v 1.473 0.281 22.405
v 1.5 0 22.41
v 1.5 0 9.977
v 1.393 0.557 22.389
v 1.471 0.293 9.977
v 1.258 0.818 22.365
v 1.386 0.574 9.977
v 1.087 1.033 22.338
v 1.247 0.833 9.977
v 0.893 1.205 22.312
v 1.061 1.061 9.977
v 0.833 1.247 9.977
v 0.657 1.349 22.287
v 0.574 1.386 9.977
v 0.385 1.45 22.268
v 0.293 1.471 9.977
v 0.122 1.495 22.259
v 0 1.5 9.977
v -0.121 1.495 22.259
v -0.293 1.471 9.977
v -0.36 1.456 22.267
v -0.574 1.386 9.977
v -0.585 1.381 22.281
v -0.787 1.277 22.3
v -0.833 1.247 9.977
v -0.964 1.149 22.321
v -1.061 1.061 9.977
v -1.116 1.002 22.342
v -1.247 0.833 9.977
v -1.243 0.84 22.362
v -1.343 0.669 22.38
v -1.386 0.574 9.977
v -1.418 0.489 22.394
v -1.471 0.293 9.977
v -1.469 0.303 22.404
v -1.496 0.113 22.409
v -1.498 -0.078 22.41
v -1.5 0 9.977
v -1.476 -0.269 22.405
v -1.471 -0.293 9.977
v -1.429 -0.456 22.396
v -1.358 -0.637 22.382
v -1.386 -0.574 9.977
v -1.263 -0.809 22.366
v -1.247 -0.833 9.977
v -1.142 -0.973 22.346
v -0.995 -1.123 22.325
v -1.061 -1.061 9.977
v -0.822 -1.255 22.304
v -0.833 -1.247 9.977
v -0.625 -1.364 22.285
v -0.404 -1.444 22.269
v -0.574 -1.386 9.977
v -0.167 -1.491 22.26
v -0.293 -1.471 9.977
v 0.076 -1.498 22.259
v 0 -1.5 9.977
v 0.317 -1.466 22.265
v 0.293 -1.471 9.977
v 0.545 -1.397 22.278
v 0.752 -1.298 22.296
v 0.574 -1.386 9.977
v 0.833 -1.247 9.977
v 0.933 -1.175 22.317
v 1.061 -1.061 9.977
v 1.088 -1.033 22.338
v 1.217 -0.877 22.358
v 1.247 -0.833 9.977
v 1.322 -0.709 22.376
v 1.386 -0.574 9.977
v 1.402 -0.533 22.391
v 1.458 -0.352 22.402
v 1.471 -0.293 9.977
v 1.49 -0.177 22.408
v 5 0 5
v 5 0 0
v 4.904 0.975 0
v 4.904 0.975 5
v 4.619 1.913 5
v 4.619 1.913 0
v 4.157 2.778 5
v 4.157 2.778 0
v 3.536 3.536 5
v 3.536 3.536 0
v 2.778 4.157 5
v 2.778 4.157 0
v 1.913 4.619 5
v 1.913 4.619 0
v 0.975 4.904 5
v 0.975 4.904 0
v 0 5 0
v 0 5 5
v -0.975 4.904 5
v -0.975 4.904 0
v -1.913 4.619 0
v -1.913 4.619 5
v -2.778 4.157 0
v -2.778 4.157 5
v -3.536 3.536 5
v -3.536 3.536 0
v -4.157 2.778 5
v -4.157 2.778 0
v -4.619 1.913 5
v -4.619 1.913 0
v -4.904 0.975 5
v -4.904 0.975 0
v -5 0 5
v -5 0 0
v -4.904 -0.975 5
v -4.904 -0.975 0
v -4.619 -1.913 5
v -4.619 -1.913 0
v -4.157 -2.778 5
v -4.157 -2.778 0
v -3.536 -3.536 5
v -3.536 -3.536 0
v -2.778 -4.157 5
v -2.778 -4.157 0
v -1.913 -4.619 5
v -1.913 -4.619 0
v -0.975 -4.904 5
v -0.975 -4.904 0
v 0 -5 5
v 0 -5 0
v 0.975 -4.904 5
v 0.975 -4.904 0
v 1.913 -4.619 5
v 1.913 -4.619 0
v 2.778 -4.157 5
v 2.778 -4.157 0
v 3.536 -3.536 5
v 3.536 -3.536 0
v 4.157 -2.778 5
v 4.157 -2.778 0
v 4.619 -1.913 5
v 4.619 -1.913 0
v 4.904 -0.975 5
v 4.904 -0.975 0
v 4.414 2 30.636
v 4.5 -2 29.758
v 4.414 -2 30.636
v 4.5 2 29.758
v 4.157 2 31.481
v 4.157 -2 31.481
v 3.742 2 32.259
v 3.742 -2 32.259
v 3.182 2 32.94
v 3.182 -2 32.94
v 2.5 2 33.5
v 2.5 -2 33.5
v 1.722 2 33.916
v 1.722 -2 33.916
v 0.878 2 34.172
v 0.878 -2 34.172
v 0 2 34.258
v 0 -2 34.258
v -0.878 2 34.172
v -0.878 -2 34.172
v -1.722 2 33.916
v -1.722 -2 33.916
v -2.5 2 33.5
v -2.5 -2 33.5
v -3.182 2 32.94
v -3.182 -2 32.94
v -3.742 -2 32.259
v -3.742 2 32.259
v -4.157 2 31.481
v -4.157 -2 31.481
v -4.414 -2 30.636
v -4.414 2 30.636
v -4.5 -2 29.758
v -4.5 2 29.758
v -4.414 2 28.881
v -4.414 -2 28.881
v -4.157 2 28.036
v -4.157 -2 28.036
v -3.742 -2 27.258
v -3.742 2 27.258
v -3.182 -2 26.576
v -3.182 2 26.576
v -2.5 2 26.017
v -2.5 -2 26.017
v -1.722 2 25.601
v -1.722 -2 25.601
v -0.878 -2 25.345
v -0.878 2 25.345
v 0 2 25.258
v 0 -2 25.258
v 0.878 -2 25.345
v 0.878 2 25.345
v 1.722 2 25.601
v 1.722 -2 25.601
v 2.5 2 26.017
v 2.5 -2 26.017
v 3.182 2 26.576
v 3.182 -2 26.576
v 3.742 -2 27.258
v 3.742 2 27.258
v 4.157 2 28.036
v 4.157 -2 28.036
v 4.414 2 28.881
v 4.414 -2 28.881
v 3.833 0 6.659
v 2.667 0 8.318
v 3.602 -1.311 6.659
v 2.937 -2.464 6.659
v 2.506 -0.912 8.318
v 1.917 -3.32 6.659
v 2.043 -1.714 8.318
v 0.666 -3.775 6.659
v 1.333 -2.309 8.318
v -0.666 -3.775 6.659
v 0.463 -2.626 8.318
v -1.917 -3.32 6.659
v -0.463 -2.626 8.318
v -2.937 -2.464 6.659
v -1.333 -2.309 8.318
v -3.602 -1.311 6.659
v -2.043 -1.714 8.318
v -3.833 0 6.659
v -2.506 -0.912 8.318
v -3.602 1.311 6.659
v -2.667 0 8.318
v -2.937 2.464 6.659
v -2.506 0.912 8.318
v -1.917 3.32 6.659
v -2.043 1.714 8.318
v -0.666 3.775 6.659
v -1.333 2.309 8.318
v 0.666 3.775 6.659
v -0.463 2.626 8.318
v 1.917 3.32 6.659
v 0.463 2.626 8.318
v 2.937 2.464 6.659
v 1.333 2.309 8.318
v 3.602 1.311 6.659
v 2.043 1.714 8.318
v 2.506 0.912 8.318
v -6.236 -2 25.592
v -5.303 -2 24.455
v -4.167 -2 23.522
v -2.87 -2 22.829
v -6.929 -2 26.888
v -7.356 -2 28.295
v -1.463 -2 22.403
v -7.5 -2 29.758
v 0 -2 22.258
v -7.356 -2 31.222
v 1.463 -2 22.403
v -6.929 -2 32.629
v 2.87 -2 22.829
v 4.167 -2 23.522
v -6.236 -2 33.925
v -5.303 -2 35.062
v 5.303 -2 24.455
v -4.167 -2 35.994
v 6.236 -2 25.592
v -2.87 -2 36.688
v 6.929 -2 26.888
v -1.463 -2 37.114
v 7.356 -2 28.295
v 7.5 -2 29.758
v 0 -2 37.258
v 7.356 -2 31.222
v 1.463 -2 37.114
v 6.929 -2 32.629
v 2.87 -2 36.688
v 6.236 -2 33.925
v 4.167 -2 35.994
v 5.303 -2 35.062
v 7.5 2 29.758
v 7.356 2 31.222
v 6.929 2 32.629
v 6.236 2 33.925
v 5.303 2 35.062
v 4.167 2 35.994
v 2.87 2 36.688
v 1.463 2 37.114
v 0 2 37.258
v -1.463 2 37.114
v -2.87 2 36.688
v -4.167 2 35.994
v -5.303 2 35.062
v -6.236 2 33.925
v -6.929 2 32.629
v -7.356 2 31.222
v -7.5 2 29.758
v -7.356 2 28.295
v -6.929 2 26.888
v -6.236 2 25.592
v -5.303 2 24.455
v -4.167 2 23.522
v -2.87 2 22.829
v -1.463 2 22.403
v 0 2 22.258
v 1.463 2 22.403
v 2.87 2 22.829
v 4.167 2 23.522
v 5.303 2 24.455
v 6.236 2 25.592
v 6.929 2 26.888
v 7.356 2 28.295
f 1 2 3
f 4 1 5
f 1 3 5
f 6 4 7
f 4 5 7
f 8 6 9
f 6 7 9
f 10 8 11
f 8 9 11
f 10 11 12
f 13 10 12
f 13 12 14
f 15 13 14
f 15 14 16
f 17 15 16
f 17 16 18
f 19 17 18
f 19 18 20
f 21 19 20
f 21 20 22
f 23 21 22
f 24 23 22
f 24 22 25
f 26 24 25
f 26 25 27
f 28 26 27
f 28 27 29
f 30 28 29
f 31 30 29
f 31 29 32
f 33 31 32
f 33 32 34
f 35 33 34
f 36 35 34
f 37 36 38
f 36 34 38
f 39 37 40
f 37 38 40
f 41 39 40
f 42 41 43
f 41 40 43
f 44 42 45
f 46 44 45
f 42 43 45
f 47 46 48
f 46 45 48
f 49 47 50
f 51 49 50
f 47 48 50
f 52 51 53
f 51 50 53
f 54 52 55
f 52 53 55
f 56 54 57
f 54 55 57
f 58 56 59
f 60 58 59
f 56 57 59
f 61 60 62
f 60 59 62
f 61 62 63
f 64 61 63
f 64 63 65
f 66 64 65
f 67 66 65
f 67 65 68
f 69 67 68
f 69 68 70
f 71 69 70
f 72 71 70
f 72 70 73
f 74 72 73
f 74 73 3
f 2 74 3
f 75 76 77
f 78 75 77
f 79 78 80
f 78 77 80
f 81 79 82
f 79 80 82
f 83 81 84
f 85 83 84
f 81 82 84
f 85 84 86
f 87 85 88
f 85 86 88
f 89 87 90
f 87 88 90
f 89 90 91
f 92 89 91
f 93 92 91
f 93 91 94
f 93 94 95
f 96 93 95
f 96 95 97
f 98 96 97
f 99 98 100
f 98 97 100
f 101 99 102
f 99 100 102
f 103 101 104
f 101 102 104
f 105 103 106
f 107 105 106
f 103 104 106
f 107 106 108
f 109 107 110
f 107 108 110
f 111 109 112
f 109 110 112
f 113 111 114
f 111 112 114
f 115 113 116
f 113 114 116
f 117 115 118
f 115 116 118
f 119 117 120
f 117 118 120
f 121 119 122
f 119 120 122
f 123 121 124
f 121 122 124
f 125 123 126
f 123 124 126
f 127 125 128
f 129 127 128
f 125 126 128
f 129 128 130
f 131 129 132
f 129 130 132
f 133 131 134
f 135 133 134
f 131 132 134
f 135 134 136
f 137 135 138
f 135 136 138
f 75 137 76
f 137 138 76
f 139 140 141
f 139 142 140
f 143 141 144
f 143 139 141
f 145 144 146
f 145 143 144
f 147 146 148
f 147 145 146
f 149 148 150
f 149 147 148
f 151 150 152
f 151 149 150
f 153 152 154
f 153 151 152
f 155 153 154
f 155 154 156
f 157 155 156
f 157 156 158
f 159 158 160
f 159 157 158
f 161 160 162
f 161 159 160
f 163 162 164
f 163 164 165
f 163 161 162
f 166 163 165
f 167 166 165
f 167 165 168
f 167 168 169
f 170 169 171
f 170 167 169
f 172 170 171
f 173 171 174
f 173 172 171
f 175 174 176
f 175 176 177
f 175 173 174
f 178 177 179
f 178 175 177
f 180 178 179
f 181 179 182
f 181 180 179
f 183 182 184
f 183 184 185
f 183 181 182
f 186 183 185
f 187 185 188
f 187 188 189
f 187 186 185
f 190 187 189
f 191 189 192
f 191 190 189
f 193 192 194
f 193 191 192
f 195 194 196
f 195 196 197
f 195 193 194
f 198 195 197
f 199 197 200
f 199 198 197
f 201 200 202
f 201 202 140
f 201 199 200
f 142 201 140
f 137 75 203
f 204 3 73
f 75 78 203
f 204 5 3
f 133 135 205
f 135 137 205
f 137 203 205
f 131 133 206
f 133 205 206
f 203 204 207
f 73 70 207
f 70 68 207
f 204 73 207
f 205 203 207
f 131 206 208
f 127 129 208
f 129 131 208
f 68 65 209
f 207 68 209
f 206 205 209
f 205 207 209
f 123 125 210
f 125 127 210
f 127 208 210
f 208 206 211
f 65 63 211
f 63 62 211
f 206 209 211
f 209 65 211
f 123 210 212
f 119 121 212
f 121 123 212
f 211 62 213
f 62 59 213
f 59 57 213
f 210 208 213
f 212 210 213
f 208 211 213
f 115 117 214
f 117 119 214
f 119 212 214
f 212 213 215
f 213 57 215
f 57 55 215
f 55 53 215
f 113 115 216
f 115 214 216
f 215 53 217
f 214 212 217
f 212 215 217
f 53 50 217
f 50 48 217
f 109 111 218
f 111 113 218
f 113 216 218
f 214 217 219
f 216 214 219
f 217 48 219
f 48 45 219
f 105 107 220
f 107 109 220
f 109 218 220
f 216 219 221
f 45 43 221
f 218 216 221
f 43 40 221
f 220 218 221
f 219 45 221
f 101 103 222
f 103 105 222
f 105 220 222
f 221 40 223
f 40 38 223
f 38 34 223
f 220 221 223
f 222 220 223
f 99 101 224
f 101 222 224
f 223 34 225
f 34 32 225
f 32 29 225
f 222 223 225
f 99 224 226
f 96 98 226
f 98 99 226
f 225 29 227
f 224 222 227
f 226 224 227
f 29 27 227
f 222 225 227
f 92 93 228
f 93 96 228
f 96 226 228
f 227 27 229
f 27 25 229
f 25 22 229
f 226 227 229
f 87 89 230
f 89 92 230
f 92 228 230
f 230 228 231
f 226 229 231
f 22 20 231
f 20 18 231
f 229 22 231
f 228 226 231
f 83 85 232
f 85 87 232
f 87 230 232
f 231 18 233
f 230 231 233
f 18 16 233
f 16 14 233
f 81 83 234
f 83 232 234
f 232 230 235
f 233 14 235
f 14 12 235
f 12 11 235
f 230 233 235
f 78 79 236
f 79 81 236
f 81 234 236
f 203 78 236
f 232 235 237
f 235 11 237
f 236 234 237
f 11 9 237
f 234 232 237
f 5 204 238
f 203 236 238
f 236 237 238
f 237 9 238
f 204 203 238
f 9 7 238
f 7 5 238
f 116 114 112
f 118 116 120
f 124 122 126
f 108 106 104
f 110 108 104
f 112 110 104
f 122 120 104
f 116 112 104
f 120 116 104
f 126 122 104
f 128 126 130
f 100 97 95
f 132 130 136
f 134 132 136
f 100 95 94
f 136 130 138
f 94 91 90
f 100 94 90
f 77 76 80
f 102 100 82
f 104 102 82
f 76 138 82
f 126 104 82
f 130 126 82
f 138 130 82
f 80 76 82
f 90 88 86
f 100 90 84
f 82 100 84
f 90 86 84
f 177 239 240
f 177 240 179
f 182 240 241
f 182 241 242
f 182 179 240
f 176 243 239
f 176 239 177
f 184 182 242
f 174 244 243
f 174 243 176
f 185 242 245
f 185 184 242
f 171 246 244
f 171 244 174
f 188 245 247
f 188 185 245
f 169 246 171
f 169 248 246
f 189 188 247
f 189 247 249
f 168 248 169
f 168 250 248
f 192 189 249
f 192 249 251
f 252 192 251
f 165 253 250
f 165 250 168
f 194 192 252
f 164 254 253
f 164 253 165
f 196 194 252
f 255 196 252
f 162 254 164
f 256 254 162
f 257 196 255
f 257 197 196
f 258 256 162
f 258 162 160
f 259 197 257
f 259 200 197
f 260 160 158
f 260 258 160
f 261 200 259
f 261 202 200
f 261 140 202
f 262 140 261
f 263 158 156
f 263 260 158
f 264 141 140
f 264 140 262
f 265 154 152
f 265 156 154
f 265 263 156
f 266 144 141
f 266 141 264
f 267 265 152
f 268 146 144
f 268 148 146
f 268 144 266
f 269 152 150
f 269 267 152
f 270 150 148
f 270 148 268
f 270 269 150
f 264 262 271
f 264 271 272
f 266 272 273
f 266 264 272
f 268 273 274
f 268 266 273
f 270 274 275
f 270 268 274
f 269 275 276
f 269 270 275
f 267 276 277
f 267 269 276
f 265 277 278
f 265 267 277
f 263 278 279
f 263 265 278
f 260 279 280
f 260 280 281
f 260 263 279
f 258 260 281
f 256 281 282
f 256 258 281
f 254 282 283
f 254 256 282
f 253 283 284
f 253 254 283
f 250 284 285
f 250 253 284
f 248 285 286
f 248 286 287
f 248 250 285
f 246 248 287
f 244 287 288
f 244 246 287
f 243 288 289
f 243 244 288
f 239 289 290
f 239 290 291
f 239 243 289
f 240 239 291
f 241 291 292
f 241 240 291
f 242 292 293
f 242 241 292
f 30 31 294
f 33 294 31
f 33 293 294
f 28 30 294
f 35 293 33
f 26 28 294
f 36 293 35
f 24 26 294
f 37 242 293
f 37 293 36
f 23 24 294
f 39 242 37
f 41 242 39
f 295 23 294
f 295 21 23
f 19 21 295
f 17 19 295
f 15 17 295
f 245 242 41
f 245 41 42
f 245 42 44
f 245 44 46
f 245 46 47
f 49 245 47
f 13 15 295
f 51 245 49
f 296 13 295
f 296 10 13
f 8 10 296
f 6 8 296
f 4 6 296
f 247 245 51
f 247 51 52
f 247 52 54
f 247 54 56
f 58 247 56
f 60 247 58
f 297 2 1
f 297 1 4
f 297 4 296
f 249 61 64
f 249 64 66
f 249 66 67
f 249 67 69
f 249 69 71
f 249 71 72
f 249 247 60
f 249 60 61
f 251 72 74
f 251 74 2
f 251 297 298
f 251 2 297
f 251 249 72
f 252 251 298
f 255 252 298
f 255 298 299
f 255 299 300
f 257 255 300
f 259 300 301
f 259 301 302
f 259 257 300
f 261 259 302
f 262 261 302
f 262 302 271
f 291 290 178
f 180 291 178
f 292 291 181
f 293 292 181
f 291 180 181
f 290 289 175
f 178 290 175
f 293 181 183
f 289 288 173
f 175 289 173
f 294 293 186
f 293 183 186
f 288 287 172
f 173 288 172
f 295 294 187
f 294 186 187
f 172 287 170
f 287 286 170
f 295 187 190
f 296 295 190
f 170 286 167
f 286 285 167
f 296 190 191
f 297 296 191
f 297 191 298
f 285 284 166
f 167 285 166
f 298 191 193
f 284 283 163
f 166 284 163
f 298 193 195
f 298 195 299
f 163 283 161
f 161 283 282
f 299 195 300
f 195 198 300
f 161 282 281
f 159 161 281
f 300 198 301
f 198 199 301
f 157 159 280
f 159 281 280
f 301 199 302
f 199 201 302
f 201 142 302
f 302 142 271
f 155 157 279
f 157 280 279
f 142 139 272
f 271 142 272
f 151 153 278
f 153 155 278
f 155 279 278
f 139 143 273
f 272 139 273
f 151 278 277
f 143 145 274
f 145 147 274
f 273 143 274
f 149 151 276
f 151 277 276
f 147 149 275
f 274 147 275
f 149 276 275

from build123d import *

# Parameters (mm, degrees)
F0_R     = 5
F1_DEPTH = 5
F2_R     = 1.5
F4_DEPTH = 20
F3_R     = 7.5
F3_R_2   = 4.5
F5_DEPTH = 2


with BuildPart() as f1:
    # F0 (on Top) → F1 (new body)
    with BuildSketch(Plane.XY):
        Circle(F0_R)
    extrude(amount=F1_DEPTH)

    # F2 (on face) → F4 (join)
    with BuildSketch(Plane.XY.offset(5)):
        Circle(F2_R)
    extrude(amount=F4_DEPTH)

    # F3 (on Front) → F5 (join, symmetric)
    with BuildSketch(Plane.XZ):
        with Locations((0, 29.75847)):
            Circle(F3_R)
        with Locations((0, 29.75847)):
            Circle(F3_R_2, mode=Mode.SUBTRACT)
    extrude(amount=F5_DEPTH, both=True)

    # F3 (on Front) → F6 (revolve)
    with BuildSketch(Plane.XZ):
        Polygon((5, 5), (0, 12.11049), (0, 5), align=None)
    revolve(axis=Axis((0, 0, 8.555245), (0, 0, -1)))


solid = f1.part
